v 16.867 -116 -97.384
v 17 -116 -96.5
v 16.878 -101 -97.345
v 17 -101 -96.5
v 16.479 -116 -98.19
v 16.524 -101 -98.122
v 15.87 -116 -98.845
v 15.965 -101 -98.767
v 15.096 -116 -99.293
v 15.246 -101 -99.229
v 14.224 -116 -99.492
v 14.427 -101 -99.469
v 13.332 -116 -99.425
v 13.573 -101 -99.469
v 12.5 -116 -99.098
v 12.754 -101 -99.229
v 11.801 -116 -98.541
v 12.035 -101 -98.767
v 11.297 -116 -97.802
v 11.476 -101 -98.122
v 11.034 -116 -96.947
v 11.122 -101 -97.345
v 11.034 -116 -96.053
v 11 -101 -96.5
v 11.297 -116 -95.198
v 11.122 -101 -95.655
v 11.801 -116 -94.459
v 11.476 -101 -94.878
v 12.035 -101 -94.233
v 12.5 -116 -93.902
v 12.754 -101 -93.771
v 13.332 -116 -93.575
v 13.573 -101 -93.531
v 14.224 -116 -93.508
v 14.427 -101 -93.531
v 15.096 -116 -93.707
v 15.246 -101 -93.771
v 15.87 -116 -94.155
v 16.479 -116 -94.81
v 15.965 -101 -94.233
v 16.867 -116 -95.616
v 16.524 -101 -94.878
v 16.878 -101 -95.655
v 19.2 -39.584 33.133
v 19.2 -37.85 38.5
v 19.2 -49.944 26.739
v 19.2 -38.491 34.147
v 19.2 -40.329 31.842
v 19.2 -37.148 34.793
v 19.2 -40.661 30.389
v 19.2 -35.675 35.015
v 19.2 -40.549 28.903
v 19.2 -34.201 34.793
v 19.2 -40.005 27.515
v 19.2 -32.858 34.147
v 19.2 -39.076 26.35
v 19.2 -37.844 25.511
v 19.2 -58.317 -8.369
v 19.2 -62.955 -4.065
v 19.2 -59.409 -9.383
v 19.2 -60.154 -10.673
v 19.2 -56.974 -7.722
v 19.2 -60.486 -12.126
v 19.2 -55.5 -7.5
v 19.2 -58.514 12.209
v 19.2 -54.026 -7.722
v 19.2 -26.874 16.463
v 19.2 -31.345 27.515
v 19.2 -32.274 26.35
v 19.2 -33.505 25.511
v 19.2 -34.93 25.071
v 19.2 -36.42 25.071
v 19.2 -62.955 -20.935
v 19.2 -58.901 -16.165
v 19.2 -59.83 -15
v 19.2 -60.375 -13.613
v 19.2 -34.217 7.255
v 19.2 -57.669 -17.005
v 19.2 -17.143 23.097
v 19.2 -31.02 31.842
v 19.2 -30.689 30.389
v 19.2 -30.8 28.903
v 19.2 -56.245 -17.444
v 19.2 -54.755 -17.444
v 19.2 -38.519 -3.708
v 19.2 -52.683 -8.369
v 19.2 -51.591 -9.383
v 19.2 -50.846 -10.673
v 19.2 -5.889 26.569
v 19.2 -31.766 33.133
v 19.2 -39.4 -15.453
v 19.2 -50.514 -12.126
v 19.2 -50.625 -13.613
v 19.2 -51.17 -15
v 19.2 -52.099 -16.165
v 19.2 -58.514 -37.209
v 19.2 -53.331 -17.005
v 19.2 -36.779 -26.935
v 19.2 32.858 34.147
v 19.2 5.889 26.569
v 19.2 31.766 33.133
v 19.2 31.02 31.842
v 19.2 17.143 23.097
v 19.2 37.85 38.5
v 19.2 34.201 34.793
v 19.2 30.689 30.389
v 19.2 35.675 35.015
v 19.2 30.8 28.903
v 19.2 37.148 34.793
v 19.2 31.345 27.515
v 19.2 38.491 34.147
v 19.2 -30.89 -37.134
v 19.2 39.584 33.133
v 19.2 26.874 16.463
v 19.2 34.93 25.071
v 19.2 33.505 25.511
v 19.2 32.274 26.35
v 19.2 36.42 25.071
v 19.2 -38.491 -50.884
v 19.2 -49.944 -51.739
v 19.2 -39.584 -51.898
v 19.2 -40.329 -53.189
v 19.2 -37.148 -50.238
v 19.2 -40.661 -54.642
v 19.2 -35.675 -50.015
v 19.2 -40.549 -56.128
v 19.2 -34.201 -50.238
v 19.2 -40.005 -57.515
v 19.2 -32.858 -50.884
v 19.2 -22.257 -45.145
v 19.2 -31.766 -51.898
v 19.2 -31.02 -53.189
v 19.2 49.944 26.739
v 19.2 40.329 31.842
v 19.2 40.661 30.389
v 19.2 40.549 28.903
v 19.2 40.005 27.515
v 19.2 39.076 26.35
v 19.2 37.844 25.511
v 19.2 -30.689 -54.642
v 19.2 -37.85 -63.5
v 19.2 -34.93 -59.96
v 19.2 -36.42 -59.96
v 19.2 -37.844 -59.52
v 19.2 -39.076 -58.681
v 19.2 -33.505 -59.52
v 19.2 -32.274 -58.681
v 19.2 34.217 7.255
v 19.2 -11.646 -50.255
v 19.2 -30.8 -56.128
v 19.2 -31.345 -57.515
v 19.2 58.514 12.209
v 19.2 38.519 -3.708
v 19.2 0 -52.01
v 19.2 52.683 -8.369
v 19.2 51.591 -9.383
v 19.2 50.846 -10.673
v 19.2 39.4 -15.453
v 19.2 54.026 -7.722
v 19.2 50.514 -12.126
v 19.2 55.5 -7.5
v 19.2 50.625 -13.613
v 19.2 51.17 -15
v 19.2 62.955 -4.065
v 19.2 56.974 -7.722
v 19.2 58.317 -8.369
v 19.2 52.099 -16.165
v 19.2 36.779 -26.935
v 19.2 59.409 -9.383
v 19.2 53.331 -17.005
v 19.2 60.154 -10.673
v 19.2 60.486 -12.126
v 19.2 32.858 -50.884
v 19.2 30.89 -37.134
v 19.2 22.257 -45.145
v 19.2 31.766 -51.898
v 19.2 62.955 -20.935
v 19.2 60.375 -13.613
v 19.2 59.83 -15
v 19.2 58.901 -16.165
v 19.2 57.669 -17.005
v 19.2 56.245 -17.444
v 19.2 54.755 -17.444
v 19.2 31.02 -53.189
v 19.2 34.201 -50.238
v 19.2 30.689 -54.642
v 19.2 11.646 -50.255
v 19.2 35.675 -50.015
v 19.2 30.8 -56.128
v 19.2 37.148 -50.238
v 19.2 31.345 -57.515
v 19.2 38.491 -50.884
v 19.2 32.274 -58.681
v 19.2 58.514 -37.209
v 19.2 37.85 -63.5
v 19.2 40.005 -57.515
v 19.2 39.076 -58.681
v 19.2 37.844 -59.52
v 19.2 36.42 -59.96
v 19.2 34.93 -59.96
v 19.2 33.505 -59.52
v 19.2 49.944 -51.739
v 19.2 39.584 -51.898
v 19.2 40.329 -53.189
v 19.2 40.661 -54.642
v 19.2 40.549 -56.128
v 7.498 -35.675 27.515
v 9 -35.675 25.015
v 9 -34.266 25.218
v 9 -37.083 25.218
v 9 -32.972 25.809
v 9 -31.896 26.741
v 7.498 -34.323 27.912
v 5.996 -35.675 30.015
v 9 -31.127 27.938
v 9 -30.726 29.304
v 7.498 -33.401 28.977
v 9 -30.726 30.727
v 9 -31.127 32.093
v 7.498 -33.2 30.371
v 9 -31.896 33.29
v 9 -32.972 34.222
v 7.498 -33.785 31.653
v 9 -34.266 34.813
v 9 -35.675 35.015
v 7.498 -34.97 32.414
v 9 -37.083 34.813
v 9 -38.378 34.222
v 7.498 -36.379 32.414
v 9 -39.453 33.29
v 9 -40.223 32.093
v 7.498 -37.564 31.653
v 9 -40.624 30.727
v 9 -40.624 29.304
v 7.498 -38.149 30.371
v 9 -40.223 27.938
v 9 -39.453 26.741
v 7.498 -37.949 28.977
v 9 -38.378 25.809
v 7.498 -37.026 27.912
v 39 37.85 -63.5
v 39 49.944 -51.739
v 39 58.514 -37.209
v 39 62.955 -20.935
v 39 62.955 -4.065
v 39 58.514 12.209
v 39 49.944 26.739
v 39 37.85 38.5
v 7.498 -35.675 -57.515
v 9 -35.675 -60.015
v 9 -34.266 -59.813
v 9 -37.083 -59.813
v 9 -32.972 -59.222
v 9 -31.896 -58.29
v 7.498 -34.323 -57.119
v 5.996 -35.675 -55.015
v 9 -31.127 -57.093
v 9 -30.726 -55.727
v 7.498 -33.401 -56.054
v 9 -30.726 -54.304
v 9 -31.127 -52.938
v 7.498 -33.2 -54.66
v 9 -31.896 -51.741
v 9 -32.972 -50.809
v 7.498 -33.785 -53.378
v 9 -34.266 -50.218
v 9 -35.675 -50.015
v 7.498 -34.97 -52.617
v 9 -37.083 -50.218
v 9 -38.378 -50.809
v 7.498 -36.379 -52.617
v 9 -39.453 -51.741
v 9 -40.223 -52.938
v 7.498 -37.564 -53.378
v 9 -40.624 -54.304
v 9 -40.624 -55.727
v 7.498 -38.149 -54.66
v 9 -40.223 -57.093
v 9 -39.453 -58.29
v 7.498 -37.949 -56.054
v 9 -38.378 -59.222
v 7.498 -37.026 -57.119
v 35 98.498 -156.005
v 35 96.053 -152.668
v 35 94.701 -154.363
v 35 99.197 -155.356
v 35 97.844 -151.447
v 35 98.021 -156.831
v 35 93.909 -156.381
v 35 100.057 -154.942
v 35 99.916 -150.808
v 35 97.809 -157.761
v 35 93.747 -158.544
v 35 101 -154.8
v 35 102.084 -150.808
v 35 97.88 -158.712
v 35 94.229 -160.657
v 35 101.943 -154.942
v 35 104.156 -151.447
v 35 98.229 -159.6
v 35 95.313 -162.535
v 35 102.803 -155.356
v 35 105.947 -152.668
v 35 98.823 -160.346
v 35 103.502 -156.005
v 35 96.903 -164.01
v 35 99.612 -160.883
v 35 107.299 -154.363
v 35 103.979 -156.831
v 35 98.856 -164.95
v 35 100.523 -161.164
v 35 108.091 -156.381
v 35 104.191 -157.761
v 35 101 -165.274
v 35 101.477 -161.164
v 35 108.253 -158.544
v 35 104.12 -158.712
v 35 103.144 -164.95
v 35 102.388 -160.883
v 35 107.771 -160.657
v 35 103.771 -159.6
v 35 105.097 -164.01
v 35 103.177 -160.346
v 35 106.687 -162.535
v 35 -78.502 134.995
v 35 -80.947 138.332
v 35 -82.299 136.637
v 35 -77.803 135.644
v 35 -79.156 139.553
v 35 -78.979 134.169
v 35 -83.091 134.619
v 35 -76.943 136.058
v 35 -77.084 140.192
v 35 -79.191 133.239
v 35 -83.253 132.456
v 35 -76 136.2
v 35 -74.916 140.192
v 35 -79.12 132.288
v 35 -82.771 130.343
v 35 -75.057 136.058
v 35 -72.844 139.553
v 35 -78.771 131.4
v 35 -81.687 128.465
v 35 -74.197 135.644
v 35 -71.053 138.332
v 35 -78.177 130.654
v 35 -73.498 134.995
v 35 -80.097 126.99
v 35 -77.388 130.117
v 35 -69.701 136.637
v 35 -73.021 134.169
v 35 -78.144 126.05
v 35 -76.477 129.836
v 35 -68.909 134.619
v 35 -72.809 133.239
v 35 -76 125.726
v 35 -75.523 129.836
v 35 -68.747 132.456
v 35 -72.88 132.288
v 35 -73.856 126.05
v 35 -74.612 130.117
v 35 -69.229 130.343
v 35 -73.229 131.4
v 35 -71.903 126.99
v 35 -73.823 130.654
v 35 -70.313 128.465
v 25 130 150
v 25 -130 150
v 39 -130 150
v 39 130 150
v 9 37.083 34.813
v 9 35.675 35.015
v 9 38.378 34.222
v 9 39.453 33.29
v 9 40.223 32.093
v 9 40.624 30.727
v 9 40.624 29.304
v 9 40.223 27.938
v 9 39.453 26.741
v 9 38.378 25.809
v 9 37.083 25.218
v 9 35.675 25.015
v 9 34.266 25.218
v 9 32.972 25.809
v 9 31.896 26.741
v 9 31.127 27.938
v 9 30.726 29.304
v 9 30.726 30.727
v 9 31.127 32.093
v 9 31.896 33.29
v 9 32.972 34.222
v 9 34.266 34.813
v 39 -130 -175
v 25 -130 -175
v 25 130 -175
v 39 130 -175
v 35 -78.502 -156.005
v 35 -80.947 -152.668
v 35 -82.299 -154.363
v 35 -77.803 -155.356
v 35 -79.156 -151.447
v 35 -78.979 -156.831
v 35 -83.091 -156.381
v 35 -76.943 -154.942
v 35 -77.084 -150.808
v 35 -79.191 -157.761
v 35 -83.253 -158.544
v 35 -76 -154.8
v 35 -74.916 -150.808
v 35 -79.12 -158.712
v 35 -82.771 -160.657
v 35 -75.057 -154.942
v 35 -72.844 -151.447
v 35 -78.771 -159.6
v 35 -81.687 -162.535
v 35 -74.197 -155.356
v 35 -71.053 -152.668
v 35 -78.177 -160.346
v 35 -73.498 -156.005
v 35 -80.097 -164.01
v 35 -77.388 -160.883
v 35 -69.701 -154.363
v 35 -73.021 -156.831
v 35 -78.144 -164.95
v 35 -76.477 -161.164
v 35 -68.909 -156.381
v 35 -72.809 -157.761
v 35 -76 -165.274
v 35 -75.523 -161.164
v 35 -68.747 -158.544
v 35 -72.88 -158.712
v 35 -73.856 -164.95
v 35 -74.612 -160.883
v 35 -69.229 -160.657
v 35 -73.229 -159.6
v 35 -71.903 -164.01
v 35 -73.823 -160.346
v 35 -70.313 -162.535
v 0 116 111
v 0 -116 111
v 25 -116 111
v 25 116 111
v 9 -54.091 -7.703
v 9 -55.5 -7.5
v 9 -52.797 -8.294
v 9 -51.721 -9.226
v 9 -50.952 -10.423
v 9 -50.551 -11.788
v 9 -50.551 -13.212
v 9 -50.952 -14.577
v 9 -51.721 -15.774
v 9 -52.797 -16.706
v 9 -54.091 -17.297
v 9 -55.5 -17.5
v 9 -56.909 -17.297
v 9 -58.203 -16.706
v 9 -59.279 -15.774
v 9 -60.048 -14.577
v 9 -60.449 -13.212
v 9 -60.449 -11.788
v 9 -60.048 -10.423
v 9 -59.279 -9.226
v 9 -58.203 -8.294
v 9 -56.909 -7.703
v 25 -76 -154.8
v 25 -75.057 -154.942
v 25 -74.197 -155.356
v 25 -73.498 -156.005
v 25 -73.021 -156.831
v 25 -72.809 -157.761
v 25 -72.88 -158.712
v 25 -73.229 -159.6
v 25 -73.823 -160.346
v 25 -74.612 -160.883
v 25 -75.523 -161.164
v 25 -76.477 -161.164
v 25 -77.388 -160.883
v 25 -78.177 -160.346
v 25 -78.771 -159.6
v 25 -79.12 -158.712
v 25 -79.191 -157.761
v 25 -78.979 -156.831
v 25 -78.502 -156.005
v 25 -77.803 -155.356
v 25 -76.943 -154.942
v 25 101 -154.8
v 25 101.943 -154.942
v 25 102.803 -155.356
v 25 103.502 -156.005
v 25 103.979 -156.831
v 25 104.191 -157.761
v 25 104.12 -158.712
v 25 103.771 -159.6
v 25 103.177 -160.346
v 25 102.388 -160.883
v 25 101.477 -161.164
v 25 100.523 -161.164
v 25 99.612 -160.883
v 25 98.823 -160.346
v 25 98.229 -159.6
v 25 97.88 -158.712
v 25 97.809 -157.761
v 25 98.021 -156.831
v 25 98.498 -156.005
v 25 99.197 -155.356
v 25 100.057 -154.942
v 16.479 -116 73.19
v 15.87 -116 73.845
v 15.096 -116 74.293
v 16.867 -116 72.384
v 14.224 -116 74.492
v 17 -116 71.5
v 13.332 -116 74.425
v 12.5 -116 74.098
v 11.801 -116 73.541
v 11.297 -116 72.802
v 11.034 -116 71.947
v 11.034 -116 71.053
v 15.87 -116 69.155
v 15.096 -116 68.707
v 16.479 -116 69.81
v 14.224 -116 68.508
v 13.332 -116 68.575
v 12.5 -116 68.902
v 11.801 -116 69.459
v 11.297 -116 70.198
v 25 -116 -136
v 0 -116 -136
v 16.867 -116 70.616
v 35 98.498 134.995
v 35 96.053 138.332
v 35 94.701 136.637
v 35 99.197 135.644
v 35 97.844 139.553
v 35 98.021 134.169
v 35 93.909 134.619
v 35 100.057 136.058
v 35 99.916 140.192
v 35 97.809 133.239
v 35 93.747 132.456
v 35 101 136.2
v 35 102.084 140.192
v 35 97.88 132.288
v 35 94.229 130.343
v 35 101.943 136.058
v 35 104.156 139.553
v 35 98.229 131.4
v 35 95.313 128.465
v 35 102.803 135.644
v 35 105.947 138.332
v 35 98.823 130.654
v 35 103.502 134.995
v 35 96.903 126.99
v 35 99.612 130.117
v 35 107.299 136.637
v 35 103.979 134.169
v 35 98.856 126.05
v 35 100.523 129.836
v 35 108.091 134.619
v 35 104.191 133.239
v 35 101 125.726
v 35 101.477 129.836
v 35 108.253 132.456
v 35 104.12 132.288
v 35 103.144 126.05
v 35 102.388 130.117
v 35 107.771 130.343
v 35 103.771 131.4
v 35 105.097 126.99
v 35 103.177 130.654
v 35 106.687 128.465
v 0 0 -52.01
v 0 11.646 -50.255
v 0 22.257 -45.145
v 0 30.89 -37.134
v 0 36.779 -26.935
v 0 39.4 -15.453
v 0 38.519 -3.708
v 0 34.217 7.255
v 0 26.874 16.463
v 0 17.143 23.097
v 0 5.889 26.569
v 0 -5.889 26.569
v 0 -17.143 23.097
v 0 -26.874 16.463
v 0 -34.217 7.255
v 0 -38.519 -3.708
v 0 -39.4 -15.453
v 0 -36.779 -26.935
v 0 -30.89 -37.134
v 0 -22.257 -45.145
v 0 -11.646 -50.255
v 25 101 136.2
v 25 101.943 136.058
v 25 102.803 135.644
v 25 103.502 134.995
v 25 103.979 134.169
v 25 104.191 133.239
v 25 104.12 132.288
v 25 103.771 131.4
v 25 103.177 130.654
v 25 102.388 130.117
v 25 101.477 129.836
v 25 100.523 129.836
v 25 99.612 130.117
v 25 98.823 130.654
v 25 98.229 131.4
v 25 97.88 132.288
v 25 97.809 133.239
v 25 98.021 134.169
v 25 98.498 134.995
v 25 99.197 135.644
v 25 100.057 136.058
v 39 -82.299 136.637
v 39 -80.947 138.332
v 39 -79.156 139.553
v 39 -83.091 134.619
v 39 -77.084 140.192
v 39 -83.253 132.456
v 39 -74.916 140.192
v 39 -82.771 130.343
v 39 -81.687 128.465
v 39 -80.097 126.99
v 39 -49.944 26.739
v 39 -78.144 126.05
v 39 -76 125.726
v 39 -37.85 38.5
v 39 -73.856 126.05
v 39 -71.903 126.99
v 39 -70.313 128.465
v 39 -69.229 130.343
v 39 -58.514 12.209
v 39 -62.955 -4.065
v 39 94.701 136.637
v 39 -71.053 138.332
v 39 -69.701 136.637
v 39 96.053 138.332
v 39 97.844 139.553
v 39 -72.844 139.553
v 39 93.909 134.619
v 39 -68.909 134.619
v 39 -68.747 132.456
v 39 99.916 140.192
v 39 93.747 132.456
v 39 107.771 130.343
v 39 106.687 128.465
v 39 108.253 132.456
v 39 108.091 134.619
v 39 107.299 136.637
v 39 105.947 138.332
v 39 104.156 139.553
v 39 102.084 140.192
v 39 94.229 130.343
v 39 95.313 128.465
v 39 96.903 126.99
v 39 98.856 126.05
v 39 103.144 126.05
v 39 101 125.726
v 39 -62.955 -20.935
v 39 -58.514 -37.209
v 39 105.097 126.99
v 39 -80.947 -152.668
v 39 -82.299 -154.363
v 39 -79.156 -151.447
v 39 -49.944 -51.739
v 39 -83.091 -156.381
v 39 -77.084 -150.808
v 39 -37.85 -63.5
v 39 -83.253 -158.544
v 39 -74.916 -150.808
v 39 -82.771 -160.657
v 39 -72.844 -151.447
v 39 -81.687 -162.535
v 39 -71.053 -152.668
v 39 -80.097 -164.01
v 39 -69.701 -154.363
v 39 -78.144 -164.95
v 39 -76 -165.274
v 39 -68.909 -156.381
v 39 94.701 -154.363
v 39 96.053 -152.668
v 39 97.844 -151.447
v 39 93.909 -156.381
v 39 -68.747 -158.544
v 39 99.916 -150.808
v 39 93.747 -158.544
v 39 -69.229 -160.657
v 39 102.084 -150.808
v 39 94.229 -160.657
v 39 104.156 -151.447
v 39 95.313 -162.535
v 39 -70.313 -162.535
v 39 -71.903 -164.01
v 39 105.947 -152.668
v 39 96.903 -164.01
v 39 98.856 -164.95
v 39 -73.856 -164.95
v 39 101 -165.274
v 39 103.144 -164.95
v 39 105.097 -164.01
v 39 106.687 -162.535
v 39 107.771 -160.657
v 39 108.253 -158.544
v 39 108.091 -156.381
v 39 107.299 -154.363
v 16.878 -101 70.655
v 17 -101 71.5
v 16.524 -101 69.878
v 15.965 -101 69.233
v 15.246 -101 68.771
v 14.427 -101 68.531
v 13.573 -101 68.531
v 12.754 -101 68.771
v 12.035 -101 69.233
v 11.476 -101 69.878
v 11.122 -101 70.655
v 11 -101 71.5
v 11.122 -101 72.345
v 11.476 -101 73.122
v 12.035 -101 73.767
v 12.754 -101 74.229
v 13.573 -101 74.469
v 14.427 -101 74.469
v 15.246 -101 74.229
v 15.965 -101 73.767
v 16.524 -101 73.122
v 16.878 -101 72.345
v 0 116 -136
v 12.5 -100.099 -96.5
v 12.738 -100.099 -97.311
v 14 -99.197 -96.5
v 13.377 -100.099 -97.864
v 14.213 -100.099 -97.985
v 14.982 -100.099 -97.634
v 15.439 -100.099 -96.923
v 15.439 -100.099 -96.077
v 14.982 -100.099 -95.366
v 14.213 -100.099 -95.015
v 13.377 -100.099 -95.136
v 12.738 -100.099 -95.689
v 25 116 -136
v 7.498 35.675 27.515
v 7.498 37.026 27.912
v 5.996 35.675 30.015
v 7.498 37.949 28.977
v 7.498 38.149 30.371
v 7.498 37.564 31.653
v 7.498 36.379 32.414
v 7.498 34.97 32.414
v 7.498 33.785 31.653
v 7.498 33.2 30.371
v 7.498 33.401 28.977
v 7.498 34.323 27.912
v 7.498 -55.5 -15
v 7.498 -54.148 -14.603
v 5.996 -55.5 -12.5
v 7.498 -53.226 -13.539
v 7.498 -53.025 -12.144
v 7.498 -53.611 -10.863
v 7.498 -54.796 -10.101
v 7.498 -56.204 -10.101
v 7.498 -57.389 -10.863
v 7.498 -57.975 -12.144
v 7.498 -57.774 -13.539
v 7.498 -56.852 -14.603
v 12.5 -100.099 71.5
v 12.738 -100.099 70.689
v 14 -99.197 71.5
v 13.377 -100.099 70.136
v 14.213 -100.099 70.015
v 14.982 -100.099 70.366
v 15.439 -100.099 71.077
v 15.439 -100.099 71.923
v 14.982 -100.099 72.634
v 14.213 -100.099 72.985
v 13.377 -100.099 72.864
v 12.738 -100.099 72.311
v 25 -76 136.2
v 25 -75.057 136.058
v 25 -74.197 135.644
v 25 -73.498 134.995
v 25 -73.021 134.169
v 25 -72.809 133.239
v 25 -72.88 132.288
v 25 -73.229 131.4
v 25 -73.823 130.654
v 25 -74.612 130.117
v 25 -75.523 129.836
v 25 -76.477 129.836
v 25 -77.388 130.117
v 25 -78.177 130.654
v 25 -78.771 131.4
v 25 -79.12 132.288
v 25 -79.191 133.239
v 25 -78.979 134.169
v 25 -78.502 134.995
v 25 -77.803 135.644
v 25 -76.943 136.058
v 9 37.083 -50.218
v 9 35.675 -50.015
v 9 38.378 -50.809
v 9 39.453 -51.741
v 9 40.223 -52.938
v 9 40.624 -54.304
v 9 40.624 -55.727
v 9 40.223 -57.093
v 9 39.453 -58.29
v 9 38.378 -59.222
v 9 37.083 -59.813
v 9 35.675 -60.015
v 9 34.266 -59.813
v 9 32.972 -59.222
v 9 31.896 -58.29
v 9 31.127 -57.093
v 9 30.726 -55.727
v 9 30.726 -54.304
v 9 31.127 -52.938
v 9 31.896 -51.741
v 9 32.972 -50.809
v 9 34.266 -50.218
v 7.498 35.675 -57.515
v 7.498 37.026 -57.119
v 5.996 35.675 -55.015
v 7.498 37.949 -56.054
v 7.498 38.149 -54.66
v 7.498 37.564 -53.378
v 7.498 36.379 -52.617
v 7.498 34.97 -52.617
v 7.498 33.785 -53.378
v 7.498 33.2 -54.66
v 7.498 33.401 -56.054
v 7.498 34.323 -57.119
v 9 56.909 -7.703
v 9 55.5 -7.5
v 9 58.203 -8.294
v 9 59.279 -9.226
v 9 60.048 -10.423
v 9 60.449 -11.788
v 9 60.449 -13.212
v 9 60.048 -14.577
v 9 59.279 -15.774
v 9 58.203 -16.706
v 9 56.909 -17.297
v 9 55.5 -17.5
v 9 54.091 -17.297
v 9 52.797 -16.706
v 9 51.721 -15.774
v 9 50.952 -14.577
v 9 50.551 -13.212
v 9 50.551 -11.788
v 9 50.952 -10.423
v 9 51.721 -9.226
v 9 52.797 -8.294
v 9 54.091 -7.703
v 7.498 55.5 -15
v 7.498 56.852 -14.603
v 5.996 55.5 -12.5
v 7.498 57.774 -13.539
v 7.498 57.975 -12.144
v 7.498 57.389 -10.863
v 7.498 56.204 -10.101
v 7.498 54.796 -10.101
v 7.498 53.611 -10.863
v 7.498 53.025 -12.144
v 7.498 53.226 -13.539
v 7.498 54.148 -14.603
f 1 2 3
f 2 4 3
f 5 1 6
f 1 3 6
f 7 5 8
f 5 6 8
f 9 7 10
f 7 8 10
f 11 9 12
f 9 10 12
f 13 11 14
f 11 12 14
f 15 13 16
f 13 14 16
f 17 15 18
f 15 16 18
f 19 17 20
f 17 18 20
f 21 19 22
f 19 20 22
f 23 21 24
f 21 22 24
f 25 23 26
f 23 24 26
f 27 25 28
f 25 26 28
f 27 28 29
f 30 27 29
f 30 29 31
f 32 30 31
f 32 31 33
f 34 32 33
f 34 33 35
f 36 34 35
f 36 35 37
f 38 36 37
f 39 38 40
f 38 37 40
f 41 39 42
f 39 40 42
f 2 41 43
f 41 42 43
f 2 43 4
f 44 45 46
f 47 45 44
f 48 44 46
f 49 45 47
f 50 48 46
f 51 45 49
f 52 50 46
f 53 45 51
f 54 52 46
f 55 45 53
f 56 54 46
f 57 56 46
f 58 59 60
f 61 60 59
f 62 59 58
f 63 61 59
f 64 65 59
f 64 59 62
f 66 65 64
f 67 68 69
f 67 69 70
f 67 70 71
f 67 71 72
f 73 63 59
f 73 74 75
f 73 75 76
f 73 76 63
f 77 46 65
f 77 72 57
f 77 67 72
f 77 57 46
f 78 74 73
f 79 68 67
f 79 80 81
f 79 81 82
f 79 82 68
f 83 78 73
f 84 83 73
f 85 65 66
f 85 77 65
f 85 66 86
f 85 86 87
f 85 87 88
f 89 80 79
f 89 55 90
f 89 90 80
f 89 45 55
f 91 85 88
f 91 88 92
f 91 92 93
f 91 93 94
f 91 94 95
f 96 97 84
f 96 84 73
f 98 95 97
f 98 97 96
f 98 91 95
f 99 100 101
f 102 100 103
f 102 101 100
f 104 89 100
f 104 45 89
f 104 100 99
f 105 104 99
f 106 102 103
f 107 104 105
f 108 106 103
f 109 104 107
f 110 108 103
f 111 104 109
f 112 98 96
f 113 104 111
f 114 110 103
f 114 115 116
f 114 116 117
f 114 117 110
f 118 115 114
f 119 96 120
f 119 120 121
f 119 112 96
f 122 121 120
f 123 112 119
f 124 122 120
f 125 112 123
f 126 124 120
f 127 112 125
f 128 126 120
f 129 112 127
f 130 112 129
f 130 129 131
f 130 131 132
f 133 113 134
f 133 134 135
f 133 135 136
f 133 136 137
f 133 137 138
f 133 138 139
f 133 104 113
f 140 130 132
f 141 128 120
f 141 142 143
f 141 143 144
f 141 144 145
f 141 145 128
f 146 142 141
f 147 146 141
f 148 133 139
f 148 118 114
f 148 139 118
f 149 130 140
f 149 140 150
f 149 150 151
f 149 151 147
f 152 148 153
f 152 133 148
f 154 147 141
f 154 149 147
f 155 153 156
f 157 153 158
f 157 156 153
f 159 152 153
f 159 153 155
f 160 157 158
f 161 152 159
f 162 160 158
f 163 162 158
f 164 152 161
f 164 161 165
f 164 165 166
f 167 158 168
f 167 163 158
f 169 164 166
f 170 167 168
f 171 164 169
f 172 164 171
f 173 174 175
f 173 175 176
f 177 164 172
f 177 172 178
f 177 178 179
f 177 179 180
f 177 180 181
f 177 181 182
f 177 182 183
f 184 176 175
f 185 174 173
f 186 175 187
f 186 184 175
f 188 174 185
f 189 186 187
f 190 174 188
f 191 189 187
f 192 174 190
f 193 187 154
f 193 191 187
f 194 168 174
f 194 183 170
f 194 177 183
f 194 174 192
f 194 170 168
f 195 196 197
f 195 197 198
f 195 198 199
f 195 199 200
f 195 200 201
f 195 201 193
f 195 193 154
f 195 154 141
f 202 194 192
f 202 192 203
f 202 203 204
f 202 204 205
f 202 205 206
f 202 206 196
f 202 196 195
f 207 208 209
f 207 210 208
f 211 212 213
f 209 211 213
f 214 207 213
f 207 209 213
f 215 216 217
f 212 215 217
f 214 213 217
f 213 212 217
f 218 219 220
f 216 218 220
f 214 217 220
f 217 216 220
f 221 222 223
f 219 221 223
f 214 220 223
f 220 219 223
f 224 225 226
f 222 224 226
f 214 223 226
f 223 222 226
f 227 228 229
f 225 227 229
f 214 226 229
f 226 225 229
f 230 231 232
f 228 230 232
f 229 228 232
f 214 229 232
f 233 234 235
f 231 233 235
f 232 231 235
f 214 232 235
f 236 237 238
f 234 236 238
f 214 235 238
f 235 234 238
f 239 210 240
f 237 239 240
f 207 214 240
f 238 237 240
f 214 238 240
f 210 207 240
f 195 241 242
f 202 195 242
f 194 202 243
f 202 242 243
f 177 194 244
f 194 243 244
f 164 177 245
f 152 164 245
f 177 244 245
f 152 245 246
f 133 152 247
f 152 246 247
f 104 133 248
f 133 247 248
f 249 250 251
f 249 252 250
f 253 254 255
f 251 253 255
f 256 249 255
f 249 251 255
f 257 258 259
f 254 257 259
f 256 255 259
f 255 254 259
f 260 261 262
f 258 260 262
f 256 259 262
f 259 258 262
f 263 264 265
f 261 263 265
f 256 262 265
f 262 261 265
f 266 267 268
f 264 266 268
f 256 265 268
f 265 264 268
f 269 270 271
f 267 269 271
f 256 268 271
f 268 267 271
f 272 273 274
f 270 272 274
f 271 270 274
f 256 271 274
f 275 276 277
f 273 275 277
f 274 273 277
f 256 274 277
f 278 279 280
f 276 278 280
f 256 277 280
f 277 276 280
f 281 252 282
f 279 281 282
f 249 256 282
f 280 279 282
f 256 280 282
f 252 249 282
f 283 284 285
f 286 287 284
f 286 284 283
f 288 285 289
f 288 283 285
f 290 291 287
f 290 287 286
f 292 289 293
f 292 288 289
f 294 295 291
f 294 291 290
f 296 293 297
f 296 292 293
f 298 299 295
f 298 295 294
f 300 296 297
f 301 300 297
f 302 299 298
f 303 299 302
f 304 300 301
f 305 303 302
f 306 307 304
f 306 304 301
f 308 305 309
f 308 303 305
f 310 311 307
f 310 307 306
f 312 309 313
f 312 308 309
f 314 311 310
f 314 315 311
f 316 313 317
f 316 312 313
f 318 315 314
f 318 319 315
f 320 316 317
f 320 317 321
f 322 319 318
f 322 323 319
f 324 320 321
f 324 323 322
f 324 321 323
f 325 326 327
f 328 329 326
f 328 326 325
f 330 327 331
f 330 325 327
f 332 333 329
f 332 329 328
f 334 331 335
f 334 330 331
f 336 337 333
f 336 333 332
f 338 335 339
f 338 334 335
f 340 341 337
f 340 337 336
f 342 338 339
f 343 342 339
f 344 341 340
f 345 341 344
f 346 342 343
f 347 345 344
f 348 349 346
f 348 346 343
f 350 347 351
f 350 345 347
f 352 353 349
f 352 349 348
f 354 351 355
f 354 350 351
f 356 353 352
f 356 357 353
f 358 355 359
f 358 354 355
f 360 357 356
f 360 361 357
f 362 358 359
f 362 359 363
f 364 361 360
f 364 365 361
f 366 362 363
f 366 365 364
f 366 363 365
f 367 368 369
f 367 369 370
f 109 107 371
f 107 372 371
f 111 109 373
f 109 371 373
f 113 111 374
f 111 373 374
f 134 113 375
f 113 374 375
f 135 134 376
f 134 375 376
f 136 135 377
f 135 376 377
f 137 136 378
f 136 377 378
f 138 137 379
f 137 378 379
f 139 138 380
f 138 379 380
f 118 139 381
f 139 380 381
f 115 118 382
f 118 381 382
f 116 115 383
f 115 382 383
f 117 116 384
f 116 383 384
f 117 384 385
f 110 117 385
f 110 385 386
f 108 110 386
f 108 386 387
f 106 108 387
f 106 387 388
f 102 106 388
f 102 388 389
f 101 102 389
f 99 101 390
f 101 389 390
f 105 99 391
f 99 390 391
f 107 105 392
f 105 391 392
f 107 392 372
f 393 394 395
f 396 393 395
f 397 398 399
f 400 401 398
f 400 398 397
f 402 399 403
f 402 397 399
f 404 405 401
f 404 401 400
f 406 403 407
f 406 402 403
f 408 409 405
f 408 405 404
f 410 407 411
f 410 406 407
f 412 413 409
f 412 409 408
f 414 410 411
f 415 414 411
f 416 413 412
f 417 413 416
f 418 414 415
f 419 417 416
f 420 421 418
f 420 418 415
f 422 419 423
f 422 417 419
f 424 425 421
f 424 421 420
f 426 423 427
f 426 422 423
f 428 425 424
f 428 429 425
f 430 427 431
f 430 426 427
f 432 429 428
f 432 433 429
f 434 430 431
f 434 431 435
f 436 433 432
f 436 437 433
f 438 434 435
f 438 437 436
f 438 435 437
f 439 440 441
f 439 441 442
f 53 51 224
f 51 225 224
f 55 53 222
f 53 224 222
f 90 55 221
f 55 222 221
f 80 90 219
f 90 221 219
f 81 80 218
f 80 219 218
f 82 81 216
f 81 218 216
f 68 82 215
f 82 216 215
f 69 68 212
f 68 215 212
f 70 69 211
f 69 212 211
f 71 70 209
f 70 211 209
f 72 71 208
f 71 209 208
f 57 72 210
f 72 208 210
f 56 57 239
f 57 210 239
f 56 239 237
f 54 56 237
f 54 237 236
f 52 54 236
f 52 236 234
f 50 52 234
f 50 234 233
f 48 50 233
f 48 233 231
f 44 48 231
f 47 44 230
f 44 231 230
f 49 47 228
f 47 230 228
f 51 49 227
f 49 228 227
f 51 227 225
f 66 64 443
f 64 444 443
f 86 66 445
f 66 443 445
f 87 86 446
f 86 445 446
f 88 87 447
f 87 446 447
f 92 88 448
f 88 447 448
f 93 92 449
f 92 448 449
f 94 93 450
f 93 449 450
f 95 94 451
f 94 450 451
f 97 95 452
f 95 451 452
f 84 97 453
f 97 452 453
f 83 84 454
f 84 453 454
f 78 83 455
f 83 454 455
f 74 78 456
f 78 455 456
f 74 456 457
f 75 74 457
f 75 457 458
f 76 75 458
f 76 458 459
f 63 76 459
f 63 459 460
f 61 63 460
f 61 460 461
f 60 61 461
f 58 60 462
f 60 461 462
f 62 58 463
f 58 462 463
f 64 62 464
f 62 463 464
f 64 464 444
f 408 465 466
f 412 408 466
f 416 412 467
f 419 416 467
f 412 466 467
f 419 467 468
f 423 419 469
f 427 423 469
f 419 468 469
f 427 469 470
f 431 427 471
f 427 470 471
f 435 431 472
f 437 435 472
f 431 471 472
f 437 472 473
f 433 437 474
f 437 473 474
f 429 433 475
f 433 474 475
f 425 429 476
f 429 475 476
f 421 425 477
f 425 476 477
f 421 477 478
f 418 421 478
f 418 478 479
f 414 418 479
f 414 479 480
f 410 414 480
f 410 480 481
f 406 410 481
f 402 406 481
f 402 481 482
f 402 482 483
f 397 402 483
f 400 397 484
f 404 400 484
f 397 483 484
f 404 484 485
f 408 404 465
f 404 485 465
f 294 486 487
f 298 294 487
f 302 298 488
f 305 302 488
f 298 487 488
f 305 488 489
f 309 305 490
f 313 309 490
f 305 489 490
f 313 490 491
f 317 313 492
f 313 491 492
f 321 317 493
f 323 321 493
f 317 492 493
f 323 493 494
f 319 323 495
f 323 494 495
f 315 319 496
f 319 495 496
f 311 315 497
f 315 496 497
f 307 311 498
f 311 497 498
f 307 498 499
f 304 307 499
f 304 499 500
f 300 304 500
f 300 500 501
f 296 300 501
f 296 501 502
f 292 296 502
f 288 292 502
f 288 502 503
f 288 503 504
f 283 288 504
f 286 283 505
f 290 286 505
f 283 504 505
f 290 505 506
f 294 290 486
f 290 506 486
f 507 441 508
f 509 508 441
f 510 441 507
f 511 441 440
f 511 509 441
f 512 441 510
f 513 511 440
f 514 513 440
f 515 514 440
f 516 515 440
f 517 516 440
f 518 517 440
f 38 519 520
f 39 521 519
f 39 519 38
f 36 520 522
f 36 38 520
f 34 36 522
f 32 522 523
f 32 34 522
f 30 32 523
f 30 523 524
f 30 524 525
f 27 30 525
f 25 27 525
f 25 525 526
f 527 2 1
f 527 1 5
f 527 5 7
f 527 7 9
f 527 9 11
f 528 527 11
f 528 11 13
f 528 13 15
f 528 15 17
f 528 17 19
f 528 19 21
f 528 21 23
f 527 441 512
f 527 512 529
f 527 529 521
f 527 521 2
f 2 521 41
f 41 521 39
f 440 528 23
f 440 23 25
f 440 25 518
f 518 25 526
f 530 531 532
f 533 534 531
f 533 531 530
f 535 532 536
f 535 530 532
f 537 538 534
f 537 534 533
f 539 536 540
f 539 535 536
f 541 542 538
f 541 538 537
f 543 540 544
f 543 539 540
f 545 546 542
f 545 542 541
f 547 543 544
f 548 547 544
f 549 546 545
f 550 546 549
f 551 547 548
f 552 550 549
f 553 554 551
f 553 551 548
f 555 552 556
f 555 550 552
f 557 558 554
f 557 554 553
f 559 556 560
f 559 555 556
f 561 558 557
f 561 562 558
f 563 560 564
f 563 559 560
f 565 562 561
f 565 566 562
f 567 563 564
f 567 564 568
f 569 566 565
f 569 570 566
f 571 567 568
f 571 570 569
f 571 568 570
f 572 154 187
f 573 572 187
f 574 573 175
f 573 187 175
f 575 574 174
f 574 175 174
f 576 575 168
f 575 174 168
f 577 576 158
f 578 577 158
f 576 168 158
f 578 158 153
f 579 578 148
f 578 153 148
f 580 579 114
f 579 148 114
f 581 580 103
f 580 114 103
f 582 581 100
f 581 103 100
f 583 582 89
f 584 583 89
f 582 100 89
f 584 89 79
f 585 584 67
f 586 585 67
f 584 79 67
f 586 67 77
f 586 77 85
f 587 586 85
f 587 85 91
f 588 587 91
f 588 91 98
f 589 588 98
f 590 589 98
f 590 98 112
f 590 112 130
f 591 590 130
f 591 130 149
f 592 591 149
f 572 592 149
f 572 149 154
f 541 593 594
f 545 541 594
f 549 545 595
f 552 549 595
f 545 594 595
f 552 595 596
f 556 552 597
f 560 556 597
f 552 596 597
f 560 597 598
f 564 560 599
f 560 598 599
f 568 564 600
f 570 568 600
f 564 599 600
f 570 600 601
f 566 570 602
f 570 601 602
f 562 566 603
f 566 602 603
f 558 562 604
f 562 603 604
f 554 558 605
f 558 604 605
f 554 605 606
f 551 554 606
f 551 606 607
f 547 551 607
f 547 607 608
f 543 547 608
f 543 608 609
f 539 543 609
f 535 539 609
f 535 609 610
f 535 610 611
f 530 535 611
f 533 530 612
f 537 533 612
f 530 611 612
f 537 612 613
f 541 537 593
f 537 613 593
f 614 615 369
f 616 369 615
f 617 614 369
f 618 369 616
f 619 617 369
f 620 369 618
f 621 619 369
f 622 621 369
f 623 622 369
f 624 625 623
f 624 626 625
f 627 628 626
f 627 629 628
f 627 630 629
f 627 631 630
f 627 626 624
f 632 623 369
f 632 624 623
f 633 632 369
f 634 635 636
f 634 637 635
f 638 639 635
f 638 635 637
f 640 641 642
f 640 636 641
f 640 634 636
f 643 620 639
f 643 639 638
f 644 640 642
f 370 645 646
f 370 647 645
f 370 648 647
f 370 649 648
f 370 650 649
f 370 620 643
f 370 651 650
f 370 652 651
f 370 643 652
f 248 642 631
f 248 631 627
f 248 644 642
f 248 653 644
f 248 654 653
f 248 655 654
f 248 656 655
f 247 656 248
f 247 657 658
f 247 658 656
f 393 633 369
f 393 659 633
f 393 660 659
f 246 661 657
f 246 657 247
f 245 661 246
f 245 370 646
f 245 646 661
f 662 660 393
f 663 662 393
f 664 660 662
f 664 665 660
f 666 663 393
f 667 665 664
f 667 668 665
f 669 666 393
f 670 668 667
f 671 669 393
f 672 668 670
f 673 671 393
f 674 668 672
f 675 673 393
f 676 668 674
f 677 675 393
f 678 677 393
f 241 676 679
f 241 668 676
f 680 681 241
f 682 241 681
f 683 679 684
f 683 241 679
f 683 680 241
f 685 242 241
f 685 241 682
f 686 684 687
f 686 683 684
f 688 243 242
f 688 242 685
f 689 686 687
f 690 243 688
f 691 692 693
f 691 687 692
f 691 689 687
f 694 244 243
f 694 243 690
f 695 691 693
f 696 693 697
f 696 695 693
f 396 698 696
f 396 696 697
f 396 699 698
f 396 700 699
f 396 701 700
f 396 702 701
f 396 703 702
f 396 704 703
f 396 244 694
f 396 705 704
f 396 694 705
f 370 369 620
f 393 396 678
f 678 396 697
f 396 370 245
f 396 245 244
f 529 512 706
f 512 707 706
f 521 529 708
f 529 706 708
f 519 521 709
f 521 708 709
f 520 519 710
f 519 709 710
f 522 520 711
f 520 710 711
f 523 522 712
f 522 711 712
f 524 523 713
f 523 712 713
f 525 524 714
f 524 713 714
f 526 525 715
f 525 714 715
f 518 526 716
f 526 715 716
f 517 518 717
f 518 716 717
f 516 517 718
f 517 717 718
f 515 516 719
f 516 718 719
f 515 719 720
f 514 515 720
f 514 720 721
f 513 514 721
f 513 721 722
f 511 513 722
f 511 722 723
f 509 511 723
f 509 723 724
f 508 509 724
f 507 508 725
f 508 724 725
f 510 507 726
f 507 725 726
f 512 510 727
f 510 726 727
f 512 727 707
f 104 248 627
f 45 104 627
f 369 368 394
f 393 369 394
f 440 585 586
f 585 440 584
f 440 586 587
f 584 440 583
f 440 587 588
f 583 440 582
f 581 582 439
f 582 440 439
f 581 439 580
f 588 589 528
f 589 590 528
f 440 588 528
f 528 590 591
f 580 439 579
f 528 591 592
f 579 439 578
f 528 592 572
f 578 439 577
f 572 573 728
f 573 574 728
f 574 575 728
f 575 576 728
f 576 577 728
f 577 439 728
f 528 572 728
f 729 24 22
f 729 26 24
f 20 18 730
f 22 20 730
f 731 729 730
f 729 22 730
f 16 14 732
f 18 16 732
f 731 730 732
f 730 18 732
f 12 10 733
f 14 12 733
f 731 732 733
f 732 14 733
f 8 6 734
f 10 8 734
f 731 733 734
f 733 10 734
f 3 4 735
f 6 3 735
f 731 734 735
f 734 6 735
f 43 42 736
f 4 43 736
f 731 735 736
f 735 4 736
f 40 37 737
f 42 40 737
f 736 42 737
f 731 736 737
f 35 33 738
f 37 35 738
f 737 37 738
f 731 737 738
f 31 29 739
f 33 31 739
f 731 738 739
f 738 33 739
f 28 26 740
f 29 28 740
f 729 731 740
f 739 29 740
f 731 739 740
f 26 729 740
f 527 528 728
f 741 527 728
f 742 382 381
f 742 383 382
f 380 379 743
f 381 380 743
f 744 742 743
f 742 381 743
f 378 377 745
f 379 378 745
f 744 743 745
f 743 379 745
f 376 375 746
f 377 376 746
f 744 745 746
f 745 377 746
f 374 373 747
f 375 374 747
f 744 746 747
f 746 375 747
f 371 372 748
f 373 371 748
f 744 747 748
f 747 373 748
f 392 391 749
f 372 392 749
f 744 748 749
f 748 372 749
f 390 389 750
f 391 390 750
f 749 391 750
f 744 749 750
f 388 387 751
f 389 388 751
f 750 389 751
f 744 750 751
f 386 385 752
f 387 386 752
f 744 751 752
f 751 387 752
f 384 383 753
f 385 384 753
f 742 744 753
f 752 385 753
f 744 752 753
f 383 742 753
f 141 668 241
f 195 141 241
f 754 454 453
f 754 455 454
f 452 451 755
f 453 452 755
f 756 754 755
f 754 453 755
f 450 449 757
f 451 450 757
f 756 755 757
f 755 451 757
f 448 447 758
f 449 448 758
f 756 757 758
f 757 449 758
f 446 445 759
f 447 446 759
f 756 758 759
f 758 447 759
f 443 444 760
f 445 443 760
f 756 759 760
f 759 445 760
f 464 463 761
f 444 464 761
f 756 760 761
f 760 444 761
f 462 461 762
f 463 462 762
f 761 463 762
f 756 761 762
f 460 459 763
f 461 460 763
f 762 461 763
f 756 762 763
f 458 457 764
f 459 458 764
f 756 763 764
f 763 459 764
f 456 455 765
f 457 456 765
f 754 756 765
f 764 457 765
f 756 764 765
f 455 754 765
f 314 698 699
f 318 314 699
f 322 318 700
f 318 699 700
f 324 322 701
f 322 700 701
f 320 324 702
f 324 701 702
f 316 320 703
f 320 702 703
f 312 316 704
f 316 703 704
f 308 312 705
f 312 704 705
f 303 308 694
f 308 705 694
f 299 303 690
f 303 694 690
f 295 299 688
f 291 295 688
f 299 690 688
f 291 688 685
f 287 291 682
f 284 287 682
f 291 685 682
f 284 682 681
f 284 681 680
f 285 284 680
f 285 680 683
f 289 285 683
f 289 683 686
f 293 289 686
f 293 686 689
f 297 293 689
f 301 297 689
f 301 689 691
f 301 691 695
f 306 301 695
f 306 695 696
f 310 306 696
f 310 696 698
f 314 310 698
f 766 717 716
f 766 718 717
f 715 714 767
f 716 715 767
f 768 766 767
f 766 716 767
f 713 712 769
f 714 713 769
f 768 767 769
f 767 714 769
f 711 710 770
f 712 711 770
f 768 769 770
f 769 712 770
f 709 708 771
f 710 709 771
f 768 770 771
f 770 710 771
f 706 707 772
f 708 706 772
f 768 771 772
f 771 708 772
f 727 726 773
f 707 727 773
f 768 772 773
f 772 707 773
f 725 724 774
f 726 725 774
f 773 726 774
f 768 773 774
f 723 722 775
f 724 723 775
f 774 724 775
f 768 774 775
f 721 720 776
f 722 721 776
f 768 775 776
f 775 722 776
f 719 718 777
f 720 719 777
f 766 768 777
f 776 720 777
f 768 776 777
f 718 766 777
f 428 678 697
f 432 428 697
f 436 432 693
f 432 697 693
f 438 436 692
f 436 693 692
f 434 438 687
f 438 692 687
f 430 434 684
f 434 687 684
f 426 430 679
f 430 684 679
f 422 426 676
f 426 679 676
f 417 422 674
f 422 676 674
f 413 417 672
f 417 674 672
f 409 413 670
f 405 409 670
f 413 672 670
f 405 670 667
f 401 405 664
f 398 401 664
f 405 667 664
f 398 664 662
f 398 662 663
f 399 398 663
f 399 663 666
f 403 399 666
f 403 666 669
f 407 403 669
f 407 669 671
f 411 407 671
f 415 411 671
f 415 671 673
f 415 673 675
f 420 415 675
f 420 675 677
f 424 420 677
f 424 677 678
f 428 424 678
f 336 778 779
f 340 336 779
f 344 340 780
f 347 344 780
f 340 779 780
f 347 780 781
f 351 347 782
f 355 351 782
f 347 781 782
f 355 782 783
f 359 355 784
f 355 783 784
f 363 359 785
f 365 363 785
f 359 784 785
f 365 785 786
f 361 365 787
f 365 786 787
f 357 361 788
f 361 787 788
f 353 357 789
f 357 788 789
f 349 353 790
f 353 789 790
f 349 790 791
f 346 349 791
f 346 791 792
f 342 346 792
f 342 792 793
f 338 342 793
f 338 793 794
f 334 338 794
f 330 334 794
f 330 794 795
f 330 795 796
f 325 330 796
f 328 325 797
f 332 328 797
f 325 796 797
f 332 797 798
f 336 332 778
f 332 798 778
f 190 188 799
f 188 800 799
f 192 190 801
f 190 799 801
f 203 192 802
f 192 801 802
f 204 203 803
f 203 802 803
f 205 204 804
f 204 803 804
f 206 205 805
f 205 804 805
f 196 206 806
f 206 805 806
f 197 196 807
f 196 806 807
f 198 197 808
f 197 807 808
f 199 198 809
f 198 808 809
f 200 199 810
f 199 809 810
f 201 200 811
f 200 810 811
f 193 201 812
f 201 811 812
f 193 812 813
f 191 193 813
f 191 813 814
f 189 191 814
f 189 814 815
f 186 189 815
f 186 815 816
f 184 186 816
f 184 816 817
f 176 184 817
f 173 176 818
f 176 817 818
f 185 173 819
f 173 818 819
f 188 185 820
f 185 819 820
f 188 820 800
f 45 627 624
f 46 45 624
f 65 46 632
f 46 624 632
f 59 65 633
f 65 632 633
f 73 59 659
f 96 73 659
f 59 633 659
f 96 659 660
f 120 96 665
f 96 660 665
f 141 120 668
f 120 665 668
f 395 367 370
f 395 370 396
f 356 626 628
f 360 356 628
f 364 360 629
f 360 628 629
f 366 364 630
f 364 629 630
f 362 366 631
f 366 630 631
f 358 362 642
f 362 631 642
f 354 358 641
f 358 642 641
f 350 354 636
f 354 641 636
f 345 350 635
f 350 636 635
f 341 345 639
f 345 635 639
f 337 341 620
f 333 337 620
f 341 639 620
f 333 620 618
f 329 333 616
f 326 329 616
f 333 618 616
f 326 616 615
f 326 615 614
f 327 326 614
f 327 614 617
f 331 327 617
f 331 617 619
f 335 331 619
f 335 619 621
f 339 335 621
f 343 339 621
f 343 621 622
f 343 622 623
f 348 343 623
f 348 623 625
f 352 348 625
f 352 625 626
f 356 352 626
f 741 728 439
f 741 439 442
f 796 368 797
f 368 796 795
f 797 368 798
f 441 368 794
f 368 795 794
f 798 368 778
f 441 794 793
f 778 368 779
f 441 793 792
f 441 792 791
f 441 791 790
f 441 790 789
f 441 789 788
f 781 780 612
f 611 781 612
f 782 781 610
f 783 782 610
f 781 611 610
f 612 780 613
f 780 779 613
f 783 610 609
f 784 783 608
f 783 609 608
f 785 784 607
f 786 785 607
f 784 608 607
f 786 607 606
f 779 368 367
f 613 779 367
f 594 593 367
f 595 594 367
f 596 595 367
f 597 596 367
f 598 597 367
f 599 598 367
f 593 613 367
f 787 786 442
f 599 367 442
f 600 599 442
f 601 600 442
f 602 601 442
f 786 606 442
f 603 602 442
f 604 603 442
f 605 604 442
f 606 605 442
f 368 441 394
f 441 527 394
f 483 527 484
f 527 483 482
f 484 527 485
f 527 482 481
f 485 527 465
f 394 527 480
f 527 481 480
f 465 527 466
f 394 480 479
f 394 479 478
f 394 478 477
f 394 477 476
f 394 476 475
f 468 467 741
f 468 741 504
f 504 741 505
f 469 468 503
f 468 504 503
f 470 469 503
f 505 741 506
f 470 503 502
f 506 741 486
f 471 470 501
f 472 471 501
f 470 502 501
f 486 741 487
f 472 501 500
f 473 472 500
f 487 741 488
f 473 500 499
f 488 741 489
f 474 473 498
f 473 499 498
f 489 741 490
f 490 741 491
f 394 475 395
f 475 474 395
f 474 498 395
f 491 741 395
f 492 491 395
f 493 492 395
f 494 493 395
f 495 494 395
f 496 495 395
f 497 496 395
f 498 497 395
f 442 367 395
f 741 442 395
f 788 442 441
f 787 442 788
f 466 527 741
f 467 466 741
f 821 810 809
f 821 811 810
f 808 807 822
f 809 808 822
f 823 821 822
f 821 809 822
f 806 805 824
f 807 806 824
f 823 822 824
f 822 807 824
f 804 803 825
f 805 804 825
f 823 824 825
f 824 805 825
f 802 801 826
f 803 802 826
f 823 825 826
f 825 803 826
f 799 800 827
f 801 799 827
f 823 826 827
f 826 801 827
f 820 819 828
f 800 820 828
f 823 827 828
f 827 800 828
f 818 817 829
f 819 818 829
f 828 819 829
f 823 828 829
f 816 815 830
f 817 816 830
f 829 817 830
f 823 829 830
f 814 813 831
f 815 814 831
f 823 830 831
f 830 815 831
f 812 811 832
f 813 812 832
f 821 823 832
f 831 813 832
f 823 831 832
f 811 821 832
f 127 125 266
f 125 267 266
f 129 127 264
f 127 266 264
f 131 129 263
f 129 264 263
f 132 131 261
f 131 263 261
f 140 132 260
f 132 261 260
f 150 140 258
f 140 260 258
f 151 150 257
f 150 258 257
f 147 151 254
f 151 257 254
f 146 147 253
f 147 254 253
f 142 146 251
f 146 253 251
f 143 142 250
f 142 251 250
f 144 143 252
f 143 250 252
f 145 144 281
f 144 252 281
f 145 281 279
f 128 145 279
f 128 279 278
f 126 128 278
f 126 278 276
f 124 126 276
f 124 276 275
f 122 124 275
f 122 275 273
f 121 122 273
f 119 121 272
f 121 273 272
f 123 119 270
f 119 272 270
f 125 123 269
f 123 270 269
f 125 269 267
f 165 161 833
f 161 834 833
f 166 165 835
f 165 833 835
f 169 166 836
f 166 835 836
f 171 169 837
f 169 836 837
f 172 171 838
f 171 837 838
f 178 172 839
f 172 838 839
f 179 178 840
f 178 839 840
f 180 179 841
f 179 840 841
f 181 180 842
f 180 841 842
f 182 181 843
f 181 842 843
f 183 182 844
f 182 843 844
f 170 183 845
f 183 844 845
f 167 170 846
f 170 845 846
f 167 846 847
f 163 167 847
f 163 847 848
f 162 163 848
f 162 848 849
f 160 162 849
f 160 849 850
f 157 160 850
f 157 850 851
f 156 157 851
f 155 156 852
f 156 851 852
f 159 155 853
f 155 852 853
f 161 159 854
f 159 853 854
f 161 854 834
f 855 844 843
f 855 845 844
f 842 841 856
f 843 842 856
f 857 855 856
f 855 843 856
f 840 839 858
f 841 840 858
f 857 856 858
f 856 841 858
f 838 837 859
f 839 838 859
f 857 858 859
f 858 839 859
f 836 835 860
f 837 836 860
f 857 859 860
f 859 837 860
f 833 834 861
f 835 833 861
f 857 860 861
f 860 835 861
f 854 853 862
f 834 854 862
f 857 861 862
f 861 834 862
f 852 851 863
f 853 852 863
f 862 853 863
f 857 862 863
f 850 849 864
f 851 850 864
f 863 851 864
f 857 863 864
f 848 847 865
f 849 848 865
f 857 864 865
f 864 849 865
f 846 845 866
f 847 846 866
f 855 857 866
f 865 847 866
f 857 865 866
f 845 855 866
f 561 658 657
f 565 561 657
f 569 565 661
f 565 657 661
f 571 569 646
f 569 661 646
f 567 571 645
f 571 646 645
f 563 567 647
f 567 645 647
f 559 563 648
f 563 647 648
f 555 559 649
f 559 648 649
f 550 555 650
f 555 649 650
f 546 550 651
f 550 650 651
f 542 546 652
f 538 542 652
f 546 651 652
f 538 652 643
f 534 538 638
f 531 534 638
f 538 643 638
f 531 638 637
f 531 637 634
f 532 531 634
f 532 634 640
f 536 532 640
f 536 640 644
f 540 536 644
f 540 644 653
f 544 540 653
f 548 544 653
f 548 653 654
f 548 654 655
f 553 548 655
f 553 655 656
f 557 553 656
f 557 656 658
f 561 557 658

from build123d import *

# Parameters (mm, degrees)
SKETCH1_W                               = 325
SKETCH1_H                               = 260
BOSS_EXTRUDE1_DEPTH                     = 39
CBORE_FOR_M6_HEX_HEAD_BOLT1_D           = 6.4
CBORE_FOR_M6_HEX_HEAD_BOLT1_DEPTH       = 30
CBORE_FOR_M6_HEX_HEAD_BOLT1_CBORE_D     = 14.547
CBORE_FOR_M6_HEX_HEAD_BOLT1_CBORE_DEPTH = 4
CBORE_FOR_M6_HEX_HEAD_BOLT1_TIP         = 1.922753981
SKETCH3_R                               = 39.51
CUT_EXTRUDE2_DEPTH                      = 39
CUT_EXTRUDE3_DEPTH                      = 19.8
F_10_0MM_DOWEL_HOLE1_D                  = 10
F_10_0MM_DOWEL_HOLE1_DEPTH              = 30
F_10_0MM_DOWEL_HOLE1_TIP                = 3.004303095
SKETCH18_W                              = 39
SKETCH18_H                              = 260
CUT_EXTRUDE5_DEPTH                      = 25
SKETCH19_W                              = 25
SKETCH19_H                              = 247
CUT_EXTRUDE6_DEPTH                      = 14
F_6_0MM_DOWEL_HOLE1_D                   = 6
F_6_0MM_DOWEL_HOLE1_DEPTH               = 15
F_6_0MM_DOWEL_HOLE1_TIP                 = 1.802581857
CUT_EXTRUDE7_DEPTH                      = 222.463315247
CUT_EXTRUDE7_DEPTH_BACK                 = 222.463315247
SKETCH23_W                              = 25
SKETCH23_H                              = 14


with BuildPart() as part:
    # Sketch1 → Boss-Extrude1 (new body)
    with BuildSketch(Plane(origin=(0, 0, 0), x_dir=(0, 0, -1), z_dir=(1, 0, 0))):
        with Locations((12.5, 0)):
            Rectangle(SKETCH1_W, SKETCH1_H)
    extrude(amount=BOSS_EXTRUDE1_DEPTH)

    # CBORE for M6 Hex Head Bolt1
    with Locations(Plane(origin=(39, 0, 0), x_dir=(0, 0, -1), z_dir=(1, 0, 0))):
        with Locations((158, 101), (158, -76), (-133, 101), (-133, -76)):
            CounterBoreHole(CBORE_FOR_M6_HEX_HEAD_BOLT1_D / 2, CBORE_FOR_M6_HEX_HEAD_BOLT1_CBORE_D / 2, CBORE_FOR_M6_HEX_HEAD_BOLT1_CBORE_DEPTH, depth=CBORE_FOR_M6_HEX_HEAD_BOLT1_DEPTH)
            with Locations((0, 0, -(CBORE_FOR_M6_HEX_HEAD_BOLT1_DEPTH + CBORE_FOR_M6_HEX_HEAD_BOLT1_TIP / 2))):  # 118° drill point
                Cone(0, CBORE_FOR_M6_HEX_HEAD_BOLT1_D / 2, CBORE_FOR_M6_HEX_HEAD_BOLT1_TIP, mode=Mode.SUBTRACT)

    # Sketch3 → Cut-Extrude2 (cut)
    with BuildSketch(Plane(origin=(39, 0, 0), x_dir=(0, 0, -1), z_dir=(1, 0, 0))):
        with Locations((12.5, 0)):
            Circle(SKETCH3_R)
    extrude(amount=-CUT_EXTRUDE2_DEPTH, mode=Mode.SUBTRACT)

    # Sketch5 → Cut-Extrude3 (cut)
    with BuildSketch(Plane(origin=(39, 0, 0), x_dir=(0, 0, -1), z_dir=(1, 0, 0))):
        with BuildLine():
            Line((-38.5, 37.85), (-38.5, -37.85))
            ThreePointArc((-38.5, -37.85), (12.5, -63.518135124), (63.5, -37.85))
            Line((63.5, -37.85), (63.5, 37.85))
            ThreePointArc((63.5, 37.85), (12.5, 63.518135124), (-38.5, 37.85))
        make_face()
    extrude(amount=-CUT_EXTRUDE3_DEPTH, mode=Mode.SUBTRACT)

    # Ø10.0mm Dowel Hole1
    with Locations(Plane(origin=(39, 0, 0), x_dir=(0, 0, -1), z_dir=(1, 0, 0))):
        with Locations((12.5, 55.5), (55.015466593, 35.674712338), (-30.015466593, 35.674712338), (-30.015466593, -35.674712338), (12.5, -55.5), (55.015466593, -35.674712338)):
            Hole(F_10_0MM_DOWEL_HOLE1_D / 2, depth=F_10_0MM_DOWEL_HOLE1_DEPTH)
            with Locations((0, 0, -(F_10_0MM_DOWEL_HOLE1_DEPTH + F_10_0MM_DOWEL_HOLE1_TIP / 2))):  # 118° drill point
                Cone(0, F_10_0MM_DOWEL_HOLE1_D / 2, F_10_0MM_DOWEL_HOLE1_TIP, mode=Mode.SUBTRACT)

    # Sketch18 → Cut-Extrude5 (cut)
    with BuildSketch(Plane(origin=(0, 0, 0), x_dir=(0, 0, -1), z_dir=(1, 0, 0))):
        with Locations((155.5, 0)):
            Rectangle(SKETCH18_W, SKETCH18_H)
        with Locations((-130.5, 0)):
            Rectangle(SKETCH18_W, SKETCH18_H)
    extrude(amount=CUT_EXTRUDE5_DEPTH, mode=Mode.SUBTRACT)

    # Sketch19 → Cut-Extrude6 (cut)
    with BuildSketch(Plane(origin=(0, -130, 0), x_dir=(-1, 0, 0), z_dir=(0, -1, 0))):
        with Locations((-12.5, 12.5)):
            Rectangle(SKETCH19_W, SKETCH19_H)
    extrude(amount=-CUT_EXTRUDE6_DEPTH, mode=Mode.SUBTRACT)

    # Ø6.0mm Dowel Hole1
    with Locations(Plane(origin=(0, -116, 0), x_dir=(-1, 0, 0), z_dir=(0, -1, 0))):
        with Locations((-14, 96.5), (-14, -71.5)):
            Hole(F_6_0MM_DOWEL_HOLE1_D / 2, depth=F_6_0MM_DOWEL_HOLE1_DEPTH)
            with Locations((0, 0, -(F_6_0MM_DOWEL_HOLE1_DEPTH + F_6_0MM_DOWEL_HOLE1_TIP / 2))):  # 118° drill point
                Cone(0, F_6_0MM_DOWEL_HOLE1_D / 2, F_6_0MM_DOWEL_HOLE1_TIP, mode=Mode.SUBTRACT)

    # Sketch23 → Cut-Extrude7 (cut, two sides: drawn at the far end of the back side and taken through both)
    with BuildSketch(Plane.XY.offset(-CUT_EXTRUDE7_DEPTH_BACK)):
        with Locations((12.5, 123)):
            Rectangle(SKETCH23_W, SKETCH23_H)
    extrude(amount=CUT_EXTRUDE7_DEPTH + CUT_EXTRUDE7_DEPTH_BACK, mode=Mode.SUBTRACT)


solid = part.part
